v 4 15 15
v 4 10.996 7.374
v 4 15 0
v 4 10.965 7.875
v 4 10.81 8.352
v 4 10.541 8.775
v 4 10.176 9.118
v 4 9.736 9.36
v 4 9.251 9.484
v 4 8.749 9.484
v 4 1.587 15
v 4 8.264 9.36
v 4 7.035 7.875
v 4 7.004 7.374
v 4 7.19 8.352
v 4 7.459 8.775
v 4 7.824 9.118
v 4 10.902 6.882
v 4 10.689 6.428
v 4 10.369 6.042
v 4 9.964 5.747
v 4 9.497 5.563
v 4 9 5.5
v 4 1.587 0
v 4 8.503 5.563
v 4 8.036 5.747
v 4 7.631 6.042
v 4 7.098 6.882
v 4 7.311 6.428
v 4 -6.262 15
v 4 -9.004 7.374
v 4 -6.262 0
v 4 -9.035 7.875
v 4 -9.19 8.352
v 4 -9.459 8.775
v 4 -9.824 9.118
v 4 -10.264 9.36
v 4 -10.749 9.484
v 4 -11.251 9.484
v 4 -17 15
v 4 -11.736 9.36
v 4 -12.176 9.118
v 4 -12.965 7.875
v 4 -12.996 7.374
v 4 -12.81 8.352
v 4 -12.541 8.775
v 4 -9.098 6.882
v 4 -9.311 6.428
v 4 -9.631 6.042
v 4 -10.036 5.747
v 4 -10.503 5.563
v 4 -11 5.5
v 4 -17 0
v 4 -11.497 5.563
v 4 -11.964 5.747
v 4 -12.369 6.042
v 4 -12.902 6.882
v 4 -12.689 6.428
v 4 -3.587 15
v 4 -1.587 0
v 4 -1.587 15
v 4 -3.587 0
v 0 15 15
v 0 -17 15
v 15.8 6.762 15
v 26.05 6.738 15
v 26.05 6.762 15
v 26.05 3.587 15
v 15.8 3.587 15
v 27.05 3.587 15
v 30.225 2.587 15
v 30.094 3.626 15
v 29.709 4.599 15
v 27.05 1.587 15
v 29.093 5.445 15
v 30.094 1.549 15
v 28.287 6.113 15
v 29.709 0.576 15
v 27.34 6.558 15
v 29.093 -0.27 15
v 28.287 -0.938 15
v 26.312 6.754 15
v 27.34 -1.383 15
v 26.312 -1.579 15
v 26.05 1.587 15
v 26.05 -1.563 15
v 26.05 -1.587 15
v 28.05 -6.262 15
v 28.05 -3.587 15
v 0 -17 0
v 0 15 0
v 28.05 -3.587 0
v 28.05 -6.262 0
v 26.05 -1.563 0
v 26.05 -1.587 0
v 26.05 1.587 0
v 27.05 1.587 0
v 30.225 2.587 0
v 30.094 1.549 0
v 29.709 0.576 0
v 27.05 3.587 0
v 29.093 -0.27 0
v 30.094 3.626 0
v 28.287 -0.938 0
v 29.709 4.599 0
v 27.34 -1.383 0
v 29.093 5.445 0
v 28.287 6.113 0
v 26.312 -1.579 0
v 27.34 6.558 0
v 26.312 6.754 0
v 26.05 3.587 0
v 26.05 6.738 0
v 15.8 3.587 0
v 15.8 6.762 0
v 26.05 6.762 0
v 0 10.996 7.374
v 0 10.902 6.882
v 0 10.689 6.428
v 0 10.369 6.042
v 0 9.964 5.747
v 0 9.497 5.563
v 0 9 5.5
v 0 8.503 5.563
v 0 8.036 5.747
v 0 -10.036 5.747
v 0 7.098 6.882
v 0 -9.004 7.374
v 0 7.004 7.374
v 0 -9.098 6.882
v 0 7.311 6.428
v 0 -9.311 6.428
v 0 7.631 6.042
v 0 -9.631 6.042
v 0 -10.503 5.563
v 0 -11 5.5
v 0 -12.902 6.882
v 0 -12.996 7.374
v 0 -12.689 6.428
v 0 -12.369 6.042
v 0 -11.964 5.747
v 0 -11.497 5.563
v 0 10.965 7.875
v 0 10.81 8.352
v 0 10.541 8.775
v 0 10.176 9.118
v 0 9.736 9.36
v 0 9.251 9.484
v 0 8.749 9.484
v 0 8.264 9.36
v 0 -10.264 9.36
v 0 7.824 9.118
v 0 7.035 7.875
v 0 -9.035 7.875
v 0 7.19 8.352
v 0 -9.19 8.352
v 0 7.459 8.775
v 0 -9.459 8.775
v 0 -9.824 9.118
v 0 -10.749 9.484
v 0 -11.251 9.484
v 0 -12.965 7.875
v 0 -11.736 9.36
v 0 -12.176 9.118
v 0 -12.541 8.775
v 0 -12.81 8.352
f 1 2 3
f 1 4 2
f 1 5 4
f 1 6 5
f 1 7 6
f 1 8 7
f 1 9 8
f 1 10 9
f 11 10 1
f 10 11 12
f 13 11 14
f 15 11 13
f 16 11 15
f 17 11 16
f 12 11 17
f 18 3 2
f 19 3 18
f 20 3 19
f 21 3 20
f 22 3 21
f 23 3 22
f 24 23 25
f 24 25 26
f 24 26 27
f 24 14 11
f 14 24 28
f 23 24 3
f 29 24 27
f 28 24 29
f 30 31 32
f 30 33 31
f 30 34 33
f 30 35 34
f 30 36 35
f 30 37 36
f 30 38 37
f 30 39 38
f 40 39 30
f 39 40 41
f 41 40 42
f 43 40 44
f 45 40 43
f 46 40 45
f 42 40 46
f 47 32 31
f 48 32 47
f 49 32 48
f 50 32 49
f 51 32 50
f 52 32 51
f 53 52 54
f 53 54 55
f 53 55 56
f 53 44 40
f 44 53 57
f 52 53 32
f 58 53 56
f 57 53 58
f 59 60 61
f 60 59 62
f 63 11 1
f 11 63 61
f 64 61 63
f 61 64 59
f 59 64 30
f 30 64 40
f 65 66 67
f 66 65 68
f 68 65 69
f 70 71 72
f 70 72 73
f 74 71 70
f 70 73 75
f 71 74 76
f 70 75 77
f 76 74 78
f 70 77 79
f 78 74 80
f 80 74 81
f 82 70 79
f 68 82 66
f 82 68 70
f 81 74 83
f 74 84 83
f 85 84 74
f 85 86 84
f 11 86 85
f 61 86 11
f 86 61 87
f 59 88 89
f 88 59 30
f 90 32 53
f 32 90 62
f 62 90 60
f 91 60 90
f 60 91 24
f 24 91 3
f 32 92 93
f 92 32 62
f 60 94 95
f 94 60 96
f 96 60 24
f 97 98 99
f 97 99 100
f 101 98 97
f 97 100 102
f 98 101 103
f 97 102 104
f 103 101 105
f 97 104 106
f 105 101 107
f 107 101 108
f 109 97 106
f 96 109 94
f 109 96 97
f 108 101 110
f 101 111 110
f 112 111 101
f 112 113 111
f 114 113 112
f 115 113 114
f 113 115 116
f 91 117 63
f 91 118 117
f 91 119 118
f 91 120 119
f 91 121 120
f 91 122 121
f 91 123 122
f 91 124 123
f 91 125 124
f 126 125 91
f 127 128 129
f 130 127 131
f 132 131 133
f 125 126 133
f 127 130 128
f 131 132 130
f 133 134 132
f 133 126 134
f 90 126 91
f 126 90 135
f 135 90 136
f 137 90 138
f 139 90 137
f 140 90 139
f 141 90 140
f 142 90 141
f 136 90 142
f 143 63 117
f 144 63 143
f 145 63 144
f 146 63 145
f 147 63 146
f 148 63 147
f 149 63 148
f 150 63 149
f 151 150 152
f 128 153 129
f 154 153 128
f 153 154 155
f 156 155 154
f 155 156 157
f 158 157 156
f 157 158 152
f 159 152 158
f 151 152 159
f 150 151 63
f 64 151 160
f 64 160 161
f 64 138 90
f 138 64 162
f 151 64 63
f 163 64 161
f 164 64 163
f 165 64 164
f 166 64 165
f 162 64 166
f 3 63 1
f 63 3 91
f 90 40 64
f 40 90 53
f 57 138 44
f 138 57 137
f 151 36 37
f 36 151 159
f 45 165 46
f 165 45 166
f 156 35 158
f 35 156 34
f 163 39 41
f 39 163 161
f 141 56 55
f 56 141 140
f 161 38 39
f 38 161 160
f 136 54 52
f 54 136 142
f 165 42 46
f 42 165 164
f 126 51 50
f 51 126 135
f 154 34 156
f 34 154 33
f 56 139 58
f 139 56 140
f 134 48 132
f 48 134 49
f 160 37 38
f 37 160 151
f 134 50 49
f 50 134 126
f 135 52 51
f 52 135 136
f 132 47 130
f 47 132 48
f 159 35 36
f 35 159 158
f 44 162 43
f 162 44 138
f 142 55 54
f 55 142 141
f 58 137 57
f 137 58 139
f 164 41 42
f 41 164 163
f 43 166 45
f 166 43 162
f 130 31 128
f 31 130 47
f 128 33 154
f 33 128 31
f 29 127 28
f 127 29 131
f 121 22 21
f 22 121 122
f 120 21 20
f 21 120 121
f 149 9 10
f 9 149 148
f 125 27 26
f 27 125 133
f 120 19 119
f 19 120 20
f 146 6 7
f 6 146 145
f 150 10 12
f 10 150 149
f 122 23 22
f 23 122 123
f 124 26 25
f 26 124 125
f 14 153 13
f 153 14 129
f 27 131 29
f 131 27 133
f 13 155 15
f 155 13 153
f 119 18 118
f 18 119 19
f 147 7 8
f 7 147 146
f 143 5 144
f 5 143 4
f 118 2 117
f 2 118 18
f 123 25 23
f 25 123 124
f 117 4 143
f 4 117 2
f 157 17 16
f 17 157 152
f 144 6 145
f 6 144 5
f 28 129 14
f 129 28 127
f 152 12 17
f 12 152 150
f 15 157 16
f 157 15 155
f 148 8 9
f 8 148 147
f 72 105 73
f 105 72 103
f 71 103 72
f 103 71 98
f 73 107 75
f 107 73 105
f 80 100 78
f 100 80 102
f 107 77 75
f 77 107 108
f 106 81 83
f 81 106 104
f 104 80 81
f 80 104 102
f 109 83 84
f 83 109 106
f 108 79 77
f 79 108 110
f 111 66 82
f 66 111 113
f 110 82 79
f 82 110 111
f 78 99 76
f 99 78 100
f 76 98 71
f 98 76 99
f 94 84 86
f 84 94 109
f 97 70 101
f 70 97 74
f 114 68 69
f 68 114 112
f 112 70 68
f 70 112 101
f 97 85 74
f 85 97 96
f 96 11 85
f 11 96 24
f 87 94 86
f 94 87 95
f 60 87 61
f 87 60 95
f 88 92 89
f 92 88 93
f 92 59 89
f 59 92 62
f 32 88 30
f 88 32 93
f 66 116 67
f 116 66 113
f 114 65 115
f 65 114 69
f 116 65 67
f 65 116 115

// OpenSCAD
//#import("/home/mark/Dropbox/printrbot/things/printrbot/pb-Y-BarEnd-x4.stl");

stem_extension = 3.6 + 2.2;
base_len=32;
base_thickness=4;

stem_len = 20.25;
stem_thickness = 3.175; // 1/8"

gap_thickness = 2;

stem_end_gap = 10;

len =22.5 + stem_extension;
wid =10;
ht   =15;
cq  = 25;
slot_len = 2;

cyl_wid=8.5;
hole_wid=1.8;

xoff=0;
yoff=-base_len/2 - 1;
zoff=0;

r_outer_curve = stem_thickness + gap_thickness/2;
xco = stem_len ;
yco = r_outer_curve/2 + 0.5;

module base() {
 translate([xoff,yoff,zoff])
  difference() {
   cube(size=[base_thickness, base_len, ht]);
   // screw holes
   translate([-15,6,ht/2]) rotate([0,90,0])
    #cylinder(r=2,h=30,$fn=cq);
   translate([-15,26,ht/2]) rotate([0,90,0])
    #cylinder(r=2,h=30,$fn=cq);
  }
}

module sticks() {
 translate([0,stem_thickness/-2,0])
  cube(size=[stem_len + stem_extension, stem_thickness, ht]);
 translate([2,stem_thickness/-2 - stem_thickness - gap_thickness + 0.5,0])
  cube(size=[stem_len + stem_extension, stem_thickness - 0.5, ht]);
 translate([stem_end_gap + stem_extension,stem_thickness/2 + gap_thickness,0])
  cube(size=[stem_len - stem_end_gap, stem_thickness, ht]);
 
  difference() {
   translate([xco +stem_extension, yco, 0])
    cylinder(r=r_outer_curve, h=ht, $fn=cq);
   translate([1,stem_thickness/2,-1])
   cube(size=[stem_len+stem_extension,gap_thickness,ht+2]);
 }
}

base();
sticks();


//rotate([0,180,0]) translate([0,0,-ht]) #import("/home/mark/Dropbox/printrbot/things/printrbot/pb-BeltClip-x2.stl");
